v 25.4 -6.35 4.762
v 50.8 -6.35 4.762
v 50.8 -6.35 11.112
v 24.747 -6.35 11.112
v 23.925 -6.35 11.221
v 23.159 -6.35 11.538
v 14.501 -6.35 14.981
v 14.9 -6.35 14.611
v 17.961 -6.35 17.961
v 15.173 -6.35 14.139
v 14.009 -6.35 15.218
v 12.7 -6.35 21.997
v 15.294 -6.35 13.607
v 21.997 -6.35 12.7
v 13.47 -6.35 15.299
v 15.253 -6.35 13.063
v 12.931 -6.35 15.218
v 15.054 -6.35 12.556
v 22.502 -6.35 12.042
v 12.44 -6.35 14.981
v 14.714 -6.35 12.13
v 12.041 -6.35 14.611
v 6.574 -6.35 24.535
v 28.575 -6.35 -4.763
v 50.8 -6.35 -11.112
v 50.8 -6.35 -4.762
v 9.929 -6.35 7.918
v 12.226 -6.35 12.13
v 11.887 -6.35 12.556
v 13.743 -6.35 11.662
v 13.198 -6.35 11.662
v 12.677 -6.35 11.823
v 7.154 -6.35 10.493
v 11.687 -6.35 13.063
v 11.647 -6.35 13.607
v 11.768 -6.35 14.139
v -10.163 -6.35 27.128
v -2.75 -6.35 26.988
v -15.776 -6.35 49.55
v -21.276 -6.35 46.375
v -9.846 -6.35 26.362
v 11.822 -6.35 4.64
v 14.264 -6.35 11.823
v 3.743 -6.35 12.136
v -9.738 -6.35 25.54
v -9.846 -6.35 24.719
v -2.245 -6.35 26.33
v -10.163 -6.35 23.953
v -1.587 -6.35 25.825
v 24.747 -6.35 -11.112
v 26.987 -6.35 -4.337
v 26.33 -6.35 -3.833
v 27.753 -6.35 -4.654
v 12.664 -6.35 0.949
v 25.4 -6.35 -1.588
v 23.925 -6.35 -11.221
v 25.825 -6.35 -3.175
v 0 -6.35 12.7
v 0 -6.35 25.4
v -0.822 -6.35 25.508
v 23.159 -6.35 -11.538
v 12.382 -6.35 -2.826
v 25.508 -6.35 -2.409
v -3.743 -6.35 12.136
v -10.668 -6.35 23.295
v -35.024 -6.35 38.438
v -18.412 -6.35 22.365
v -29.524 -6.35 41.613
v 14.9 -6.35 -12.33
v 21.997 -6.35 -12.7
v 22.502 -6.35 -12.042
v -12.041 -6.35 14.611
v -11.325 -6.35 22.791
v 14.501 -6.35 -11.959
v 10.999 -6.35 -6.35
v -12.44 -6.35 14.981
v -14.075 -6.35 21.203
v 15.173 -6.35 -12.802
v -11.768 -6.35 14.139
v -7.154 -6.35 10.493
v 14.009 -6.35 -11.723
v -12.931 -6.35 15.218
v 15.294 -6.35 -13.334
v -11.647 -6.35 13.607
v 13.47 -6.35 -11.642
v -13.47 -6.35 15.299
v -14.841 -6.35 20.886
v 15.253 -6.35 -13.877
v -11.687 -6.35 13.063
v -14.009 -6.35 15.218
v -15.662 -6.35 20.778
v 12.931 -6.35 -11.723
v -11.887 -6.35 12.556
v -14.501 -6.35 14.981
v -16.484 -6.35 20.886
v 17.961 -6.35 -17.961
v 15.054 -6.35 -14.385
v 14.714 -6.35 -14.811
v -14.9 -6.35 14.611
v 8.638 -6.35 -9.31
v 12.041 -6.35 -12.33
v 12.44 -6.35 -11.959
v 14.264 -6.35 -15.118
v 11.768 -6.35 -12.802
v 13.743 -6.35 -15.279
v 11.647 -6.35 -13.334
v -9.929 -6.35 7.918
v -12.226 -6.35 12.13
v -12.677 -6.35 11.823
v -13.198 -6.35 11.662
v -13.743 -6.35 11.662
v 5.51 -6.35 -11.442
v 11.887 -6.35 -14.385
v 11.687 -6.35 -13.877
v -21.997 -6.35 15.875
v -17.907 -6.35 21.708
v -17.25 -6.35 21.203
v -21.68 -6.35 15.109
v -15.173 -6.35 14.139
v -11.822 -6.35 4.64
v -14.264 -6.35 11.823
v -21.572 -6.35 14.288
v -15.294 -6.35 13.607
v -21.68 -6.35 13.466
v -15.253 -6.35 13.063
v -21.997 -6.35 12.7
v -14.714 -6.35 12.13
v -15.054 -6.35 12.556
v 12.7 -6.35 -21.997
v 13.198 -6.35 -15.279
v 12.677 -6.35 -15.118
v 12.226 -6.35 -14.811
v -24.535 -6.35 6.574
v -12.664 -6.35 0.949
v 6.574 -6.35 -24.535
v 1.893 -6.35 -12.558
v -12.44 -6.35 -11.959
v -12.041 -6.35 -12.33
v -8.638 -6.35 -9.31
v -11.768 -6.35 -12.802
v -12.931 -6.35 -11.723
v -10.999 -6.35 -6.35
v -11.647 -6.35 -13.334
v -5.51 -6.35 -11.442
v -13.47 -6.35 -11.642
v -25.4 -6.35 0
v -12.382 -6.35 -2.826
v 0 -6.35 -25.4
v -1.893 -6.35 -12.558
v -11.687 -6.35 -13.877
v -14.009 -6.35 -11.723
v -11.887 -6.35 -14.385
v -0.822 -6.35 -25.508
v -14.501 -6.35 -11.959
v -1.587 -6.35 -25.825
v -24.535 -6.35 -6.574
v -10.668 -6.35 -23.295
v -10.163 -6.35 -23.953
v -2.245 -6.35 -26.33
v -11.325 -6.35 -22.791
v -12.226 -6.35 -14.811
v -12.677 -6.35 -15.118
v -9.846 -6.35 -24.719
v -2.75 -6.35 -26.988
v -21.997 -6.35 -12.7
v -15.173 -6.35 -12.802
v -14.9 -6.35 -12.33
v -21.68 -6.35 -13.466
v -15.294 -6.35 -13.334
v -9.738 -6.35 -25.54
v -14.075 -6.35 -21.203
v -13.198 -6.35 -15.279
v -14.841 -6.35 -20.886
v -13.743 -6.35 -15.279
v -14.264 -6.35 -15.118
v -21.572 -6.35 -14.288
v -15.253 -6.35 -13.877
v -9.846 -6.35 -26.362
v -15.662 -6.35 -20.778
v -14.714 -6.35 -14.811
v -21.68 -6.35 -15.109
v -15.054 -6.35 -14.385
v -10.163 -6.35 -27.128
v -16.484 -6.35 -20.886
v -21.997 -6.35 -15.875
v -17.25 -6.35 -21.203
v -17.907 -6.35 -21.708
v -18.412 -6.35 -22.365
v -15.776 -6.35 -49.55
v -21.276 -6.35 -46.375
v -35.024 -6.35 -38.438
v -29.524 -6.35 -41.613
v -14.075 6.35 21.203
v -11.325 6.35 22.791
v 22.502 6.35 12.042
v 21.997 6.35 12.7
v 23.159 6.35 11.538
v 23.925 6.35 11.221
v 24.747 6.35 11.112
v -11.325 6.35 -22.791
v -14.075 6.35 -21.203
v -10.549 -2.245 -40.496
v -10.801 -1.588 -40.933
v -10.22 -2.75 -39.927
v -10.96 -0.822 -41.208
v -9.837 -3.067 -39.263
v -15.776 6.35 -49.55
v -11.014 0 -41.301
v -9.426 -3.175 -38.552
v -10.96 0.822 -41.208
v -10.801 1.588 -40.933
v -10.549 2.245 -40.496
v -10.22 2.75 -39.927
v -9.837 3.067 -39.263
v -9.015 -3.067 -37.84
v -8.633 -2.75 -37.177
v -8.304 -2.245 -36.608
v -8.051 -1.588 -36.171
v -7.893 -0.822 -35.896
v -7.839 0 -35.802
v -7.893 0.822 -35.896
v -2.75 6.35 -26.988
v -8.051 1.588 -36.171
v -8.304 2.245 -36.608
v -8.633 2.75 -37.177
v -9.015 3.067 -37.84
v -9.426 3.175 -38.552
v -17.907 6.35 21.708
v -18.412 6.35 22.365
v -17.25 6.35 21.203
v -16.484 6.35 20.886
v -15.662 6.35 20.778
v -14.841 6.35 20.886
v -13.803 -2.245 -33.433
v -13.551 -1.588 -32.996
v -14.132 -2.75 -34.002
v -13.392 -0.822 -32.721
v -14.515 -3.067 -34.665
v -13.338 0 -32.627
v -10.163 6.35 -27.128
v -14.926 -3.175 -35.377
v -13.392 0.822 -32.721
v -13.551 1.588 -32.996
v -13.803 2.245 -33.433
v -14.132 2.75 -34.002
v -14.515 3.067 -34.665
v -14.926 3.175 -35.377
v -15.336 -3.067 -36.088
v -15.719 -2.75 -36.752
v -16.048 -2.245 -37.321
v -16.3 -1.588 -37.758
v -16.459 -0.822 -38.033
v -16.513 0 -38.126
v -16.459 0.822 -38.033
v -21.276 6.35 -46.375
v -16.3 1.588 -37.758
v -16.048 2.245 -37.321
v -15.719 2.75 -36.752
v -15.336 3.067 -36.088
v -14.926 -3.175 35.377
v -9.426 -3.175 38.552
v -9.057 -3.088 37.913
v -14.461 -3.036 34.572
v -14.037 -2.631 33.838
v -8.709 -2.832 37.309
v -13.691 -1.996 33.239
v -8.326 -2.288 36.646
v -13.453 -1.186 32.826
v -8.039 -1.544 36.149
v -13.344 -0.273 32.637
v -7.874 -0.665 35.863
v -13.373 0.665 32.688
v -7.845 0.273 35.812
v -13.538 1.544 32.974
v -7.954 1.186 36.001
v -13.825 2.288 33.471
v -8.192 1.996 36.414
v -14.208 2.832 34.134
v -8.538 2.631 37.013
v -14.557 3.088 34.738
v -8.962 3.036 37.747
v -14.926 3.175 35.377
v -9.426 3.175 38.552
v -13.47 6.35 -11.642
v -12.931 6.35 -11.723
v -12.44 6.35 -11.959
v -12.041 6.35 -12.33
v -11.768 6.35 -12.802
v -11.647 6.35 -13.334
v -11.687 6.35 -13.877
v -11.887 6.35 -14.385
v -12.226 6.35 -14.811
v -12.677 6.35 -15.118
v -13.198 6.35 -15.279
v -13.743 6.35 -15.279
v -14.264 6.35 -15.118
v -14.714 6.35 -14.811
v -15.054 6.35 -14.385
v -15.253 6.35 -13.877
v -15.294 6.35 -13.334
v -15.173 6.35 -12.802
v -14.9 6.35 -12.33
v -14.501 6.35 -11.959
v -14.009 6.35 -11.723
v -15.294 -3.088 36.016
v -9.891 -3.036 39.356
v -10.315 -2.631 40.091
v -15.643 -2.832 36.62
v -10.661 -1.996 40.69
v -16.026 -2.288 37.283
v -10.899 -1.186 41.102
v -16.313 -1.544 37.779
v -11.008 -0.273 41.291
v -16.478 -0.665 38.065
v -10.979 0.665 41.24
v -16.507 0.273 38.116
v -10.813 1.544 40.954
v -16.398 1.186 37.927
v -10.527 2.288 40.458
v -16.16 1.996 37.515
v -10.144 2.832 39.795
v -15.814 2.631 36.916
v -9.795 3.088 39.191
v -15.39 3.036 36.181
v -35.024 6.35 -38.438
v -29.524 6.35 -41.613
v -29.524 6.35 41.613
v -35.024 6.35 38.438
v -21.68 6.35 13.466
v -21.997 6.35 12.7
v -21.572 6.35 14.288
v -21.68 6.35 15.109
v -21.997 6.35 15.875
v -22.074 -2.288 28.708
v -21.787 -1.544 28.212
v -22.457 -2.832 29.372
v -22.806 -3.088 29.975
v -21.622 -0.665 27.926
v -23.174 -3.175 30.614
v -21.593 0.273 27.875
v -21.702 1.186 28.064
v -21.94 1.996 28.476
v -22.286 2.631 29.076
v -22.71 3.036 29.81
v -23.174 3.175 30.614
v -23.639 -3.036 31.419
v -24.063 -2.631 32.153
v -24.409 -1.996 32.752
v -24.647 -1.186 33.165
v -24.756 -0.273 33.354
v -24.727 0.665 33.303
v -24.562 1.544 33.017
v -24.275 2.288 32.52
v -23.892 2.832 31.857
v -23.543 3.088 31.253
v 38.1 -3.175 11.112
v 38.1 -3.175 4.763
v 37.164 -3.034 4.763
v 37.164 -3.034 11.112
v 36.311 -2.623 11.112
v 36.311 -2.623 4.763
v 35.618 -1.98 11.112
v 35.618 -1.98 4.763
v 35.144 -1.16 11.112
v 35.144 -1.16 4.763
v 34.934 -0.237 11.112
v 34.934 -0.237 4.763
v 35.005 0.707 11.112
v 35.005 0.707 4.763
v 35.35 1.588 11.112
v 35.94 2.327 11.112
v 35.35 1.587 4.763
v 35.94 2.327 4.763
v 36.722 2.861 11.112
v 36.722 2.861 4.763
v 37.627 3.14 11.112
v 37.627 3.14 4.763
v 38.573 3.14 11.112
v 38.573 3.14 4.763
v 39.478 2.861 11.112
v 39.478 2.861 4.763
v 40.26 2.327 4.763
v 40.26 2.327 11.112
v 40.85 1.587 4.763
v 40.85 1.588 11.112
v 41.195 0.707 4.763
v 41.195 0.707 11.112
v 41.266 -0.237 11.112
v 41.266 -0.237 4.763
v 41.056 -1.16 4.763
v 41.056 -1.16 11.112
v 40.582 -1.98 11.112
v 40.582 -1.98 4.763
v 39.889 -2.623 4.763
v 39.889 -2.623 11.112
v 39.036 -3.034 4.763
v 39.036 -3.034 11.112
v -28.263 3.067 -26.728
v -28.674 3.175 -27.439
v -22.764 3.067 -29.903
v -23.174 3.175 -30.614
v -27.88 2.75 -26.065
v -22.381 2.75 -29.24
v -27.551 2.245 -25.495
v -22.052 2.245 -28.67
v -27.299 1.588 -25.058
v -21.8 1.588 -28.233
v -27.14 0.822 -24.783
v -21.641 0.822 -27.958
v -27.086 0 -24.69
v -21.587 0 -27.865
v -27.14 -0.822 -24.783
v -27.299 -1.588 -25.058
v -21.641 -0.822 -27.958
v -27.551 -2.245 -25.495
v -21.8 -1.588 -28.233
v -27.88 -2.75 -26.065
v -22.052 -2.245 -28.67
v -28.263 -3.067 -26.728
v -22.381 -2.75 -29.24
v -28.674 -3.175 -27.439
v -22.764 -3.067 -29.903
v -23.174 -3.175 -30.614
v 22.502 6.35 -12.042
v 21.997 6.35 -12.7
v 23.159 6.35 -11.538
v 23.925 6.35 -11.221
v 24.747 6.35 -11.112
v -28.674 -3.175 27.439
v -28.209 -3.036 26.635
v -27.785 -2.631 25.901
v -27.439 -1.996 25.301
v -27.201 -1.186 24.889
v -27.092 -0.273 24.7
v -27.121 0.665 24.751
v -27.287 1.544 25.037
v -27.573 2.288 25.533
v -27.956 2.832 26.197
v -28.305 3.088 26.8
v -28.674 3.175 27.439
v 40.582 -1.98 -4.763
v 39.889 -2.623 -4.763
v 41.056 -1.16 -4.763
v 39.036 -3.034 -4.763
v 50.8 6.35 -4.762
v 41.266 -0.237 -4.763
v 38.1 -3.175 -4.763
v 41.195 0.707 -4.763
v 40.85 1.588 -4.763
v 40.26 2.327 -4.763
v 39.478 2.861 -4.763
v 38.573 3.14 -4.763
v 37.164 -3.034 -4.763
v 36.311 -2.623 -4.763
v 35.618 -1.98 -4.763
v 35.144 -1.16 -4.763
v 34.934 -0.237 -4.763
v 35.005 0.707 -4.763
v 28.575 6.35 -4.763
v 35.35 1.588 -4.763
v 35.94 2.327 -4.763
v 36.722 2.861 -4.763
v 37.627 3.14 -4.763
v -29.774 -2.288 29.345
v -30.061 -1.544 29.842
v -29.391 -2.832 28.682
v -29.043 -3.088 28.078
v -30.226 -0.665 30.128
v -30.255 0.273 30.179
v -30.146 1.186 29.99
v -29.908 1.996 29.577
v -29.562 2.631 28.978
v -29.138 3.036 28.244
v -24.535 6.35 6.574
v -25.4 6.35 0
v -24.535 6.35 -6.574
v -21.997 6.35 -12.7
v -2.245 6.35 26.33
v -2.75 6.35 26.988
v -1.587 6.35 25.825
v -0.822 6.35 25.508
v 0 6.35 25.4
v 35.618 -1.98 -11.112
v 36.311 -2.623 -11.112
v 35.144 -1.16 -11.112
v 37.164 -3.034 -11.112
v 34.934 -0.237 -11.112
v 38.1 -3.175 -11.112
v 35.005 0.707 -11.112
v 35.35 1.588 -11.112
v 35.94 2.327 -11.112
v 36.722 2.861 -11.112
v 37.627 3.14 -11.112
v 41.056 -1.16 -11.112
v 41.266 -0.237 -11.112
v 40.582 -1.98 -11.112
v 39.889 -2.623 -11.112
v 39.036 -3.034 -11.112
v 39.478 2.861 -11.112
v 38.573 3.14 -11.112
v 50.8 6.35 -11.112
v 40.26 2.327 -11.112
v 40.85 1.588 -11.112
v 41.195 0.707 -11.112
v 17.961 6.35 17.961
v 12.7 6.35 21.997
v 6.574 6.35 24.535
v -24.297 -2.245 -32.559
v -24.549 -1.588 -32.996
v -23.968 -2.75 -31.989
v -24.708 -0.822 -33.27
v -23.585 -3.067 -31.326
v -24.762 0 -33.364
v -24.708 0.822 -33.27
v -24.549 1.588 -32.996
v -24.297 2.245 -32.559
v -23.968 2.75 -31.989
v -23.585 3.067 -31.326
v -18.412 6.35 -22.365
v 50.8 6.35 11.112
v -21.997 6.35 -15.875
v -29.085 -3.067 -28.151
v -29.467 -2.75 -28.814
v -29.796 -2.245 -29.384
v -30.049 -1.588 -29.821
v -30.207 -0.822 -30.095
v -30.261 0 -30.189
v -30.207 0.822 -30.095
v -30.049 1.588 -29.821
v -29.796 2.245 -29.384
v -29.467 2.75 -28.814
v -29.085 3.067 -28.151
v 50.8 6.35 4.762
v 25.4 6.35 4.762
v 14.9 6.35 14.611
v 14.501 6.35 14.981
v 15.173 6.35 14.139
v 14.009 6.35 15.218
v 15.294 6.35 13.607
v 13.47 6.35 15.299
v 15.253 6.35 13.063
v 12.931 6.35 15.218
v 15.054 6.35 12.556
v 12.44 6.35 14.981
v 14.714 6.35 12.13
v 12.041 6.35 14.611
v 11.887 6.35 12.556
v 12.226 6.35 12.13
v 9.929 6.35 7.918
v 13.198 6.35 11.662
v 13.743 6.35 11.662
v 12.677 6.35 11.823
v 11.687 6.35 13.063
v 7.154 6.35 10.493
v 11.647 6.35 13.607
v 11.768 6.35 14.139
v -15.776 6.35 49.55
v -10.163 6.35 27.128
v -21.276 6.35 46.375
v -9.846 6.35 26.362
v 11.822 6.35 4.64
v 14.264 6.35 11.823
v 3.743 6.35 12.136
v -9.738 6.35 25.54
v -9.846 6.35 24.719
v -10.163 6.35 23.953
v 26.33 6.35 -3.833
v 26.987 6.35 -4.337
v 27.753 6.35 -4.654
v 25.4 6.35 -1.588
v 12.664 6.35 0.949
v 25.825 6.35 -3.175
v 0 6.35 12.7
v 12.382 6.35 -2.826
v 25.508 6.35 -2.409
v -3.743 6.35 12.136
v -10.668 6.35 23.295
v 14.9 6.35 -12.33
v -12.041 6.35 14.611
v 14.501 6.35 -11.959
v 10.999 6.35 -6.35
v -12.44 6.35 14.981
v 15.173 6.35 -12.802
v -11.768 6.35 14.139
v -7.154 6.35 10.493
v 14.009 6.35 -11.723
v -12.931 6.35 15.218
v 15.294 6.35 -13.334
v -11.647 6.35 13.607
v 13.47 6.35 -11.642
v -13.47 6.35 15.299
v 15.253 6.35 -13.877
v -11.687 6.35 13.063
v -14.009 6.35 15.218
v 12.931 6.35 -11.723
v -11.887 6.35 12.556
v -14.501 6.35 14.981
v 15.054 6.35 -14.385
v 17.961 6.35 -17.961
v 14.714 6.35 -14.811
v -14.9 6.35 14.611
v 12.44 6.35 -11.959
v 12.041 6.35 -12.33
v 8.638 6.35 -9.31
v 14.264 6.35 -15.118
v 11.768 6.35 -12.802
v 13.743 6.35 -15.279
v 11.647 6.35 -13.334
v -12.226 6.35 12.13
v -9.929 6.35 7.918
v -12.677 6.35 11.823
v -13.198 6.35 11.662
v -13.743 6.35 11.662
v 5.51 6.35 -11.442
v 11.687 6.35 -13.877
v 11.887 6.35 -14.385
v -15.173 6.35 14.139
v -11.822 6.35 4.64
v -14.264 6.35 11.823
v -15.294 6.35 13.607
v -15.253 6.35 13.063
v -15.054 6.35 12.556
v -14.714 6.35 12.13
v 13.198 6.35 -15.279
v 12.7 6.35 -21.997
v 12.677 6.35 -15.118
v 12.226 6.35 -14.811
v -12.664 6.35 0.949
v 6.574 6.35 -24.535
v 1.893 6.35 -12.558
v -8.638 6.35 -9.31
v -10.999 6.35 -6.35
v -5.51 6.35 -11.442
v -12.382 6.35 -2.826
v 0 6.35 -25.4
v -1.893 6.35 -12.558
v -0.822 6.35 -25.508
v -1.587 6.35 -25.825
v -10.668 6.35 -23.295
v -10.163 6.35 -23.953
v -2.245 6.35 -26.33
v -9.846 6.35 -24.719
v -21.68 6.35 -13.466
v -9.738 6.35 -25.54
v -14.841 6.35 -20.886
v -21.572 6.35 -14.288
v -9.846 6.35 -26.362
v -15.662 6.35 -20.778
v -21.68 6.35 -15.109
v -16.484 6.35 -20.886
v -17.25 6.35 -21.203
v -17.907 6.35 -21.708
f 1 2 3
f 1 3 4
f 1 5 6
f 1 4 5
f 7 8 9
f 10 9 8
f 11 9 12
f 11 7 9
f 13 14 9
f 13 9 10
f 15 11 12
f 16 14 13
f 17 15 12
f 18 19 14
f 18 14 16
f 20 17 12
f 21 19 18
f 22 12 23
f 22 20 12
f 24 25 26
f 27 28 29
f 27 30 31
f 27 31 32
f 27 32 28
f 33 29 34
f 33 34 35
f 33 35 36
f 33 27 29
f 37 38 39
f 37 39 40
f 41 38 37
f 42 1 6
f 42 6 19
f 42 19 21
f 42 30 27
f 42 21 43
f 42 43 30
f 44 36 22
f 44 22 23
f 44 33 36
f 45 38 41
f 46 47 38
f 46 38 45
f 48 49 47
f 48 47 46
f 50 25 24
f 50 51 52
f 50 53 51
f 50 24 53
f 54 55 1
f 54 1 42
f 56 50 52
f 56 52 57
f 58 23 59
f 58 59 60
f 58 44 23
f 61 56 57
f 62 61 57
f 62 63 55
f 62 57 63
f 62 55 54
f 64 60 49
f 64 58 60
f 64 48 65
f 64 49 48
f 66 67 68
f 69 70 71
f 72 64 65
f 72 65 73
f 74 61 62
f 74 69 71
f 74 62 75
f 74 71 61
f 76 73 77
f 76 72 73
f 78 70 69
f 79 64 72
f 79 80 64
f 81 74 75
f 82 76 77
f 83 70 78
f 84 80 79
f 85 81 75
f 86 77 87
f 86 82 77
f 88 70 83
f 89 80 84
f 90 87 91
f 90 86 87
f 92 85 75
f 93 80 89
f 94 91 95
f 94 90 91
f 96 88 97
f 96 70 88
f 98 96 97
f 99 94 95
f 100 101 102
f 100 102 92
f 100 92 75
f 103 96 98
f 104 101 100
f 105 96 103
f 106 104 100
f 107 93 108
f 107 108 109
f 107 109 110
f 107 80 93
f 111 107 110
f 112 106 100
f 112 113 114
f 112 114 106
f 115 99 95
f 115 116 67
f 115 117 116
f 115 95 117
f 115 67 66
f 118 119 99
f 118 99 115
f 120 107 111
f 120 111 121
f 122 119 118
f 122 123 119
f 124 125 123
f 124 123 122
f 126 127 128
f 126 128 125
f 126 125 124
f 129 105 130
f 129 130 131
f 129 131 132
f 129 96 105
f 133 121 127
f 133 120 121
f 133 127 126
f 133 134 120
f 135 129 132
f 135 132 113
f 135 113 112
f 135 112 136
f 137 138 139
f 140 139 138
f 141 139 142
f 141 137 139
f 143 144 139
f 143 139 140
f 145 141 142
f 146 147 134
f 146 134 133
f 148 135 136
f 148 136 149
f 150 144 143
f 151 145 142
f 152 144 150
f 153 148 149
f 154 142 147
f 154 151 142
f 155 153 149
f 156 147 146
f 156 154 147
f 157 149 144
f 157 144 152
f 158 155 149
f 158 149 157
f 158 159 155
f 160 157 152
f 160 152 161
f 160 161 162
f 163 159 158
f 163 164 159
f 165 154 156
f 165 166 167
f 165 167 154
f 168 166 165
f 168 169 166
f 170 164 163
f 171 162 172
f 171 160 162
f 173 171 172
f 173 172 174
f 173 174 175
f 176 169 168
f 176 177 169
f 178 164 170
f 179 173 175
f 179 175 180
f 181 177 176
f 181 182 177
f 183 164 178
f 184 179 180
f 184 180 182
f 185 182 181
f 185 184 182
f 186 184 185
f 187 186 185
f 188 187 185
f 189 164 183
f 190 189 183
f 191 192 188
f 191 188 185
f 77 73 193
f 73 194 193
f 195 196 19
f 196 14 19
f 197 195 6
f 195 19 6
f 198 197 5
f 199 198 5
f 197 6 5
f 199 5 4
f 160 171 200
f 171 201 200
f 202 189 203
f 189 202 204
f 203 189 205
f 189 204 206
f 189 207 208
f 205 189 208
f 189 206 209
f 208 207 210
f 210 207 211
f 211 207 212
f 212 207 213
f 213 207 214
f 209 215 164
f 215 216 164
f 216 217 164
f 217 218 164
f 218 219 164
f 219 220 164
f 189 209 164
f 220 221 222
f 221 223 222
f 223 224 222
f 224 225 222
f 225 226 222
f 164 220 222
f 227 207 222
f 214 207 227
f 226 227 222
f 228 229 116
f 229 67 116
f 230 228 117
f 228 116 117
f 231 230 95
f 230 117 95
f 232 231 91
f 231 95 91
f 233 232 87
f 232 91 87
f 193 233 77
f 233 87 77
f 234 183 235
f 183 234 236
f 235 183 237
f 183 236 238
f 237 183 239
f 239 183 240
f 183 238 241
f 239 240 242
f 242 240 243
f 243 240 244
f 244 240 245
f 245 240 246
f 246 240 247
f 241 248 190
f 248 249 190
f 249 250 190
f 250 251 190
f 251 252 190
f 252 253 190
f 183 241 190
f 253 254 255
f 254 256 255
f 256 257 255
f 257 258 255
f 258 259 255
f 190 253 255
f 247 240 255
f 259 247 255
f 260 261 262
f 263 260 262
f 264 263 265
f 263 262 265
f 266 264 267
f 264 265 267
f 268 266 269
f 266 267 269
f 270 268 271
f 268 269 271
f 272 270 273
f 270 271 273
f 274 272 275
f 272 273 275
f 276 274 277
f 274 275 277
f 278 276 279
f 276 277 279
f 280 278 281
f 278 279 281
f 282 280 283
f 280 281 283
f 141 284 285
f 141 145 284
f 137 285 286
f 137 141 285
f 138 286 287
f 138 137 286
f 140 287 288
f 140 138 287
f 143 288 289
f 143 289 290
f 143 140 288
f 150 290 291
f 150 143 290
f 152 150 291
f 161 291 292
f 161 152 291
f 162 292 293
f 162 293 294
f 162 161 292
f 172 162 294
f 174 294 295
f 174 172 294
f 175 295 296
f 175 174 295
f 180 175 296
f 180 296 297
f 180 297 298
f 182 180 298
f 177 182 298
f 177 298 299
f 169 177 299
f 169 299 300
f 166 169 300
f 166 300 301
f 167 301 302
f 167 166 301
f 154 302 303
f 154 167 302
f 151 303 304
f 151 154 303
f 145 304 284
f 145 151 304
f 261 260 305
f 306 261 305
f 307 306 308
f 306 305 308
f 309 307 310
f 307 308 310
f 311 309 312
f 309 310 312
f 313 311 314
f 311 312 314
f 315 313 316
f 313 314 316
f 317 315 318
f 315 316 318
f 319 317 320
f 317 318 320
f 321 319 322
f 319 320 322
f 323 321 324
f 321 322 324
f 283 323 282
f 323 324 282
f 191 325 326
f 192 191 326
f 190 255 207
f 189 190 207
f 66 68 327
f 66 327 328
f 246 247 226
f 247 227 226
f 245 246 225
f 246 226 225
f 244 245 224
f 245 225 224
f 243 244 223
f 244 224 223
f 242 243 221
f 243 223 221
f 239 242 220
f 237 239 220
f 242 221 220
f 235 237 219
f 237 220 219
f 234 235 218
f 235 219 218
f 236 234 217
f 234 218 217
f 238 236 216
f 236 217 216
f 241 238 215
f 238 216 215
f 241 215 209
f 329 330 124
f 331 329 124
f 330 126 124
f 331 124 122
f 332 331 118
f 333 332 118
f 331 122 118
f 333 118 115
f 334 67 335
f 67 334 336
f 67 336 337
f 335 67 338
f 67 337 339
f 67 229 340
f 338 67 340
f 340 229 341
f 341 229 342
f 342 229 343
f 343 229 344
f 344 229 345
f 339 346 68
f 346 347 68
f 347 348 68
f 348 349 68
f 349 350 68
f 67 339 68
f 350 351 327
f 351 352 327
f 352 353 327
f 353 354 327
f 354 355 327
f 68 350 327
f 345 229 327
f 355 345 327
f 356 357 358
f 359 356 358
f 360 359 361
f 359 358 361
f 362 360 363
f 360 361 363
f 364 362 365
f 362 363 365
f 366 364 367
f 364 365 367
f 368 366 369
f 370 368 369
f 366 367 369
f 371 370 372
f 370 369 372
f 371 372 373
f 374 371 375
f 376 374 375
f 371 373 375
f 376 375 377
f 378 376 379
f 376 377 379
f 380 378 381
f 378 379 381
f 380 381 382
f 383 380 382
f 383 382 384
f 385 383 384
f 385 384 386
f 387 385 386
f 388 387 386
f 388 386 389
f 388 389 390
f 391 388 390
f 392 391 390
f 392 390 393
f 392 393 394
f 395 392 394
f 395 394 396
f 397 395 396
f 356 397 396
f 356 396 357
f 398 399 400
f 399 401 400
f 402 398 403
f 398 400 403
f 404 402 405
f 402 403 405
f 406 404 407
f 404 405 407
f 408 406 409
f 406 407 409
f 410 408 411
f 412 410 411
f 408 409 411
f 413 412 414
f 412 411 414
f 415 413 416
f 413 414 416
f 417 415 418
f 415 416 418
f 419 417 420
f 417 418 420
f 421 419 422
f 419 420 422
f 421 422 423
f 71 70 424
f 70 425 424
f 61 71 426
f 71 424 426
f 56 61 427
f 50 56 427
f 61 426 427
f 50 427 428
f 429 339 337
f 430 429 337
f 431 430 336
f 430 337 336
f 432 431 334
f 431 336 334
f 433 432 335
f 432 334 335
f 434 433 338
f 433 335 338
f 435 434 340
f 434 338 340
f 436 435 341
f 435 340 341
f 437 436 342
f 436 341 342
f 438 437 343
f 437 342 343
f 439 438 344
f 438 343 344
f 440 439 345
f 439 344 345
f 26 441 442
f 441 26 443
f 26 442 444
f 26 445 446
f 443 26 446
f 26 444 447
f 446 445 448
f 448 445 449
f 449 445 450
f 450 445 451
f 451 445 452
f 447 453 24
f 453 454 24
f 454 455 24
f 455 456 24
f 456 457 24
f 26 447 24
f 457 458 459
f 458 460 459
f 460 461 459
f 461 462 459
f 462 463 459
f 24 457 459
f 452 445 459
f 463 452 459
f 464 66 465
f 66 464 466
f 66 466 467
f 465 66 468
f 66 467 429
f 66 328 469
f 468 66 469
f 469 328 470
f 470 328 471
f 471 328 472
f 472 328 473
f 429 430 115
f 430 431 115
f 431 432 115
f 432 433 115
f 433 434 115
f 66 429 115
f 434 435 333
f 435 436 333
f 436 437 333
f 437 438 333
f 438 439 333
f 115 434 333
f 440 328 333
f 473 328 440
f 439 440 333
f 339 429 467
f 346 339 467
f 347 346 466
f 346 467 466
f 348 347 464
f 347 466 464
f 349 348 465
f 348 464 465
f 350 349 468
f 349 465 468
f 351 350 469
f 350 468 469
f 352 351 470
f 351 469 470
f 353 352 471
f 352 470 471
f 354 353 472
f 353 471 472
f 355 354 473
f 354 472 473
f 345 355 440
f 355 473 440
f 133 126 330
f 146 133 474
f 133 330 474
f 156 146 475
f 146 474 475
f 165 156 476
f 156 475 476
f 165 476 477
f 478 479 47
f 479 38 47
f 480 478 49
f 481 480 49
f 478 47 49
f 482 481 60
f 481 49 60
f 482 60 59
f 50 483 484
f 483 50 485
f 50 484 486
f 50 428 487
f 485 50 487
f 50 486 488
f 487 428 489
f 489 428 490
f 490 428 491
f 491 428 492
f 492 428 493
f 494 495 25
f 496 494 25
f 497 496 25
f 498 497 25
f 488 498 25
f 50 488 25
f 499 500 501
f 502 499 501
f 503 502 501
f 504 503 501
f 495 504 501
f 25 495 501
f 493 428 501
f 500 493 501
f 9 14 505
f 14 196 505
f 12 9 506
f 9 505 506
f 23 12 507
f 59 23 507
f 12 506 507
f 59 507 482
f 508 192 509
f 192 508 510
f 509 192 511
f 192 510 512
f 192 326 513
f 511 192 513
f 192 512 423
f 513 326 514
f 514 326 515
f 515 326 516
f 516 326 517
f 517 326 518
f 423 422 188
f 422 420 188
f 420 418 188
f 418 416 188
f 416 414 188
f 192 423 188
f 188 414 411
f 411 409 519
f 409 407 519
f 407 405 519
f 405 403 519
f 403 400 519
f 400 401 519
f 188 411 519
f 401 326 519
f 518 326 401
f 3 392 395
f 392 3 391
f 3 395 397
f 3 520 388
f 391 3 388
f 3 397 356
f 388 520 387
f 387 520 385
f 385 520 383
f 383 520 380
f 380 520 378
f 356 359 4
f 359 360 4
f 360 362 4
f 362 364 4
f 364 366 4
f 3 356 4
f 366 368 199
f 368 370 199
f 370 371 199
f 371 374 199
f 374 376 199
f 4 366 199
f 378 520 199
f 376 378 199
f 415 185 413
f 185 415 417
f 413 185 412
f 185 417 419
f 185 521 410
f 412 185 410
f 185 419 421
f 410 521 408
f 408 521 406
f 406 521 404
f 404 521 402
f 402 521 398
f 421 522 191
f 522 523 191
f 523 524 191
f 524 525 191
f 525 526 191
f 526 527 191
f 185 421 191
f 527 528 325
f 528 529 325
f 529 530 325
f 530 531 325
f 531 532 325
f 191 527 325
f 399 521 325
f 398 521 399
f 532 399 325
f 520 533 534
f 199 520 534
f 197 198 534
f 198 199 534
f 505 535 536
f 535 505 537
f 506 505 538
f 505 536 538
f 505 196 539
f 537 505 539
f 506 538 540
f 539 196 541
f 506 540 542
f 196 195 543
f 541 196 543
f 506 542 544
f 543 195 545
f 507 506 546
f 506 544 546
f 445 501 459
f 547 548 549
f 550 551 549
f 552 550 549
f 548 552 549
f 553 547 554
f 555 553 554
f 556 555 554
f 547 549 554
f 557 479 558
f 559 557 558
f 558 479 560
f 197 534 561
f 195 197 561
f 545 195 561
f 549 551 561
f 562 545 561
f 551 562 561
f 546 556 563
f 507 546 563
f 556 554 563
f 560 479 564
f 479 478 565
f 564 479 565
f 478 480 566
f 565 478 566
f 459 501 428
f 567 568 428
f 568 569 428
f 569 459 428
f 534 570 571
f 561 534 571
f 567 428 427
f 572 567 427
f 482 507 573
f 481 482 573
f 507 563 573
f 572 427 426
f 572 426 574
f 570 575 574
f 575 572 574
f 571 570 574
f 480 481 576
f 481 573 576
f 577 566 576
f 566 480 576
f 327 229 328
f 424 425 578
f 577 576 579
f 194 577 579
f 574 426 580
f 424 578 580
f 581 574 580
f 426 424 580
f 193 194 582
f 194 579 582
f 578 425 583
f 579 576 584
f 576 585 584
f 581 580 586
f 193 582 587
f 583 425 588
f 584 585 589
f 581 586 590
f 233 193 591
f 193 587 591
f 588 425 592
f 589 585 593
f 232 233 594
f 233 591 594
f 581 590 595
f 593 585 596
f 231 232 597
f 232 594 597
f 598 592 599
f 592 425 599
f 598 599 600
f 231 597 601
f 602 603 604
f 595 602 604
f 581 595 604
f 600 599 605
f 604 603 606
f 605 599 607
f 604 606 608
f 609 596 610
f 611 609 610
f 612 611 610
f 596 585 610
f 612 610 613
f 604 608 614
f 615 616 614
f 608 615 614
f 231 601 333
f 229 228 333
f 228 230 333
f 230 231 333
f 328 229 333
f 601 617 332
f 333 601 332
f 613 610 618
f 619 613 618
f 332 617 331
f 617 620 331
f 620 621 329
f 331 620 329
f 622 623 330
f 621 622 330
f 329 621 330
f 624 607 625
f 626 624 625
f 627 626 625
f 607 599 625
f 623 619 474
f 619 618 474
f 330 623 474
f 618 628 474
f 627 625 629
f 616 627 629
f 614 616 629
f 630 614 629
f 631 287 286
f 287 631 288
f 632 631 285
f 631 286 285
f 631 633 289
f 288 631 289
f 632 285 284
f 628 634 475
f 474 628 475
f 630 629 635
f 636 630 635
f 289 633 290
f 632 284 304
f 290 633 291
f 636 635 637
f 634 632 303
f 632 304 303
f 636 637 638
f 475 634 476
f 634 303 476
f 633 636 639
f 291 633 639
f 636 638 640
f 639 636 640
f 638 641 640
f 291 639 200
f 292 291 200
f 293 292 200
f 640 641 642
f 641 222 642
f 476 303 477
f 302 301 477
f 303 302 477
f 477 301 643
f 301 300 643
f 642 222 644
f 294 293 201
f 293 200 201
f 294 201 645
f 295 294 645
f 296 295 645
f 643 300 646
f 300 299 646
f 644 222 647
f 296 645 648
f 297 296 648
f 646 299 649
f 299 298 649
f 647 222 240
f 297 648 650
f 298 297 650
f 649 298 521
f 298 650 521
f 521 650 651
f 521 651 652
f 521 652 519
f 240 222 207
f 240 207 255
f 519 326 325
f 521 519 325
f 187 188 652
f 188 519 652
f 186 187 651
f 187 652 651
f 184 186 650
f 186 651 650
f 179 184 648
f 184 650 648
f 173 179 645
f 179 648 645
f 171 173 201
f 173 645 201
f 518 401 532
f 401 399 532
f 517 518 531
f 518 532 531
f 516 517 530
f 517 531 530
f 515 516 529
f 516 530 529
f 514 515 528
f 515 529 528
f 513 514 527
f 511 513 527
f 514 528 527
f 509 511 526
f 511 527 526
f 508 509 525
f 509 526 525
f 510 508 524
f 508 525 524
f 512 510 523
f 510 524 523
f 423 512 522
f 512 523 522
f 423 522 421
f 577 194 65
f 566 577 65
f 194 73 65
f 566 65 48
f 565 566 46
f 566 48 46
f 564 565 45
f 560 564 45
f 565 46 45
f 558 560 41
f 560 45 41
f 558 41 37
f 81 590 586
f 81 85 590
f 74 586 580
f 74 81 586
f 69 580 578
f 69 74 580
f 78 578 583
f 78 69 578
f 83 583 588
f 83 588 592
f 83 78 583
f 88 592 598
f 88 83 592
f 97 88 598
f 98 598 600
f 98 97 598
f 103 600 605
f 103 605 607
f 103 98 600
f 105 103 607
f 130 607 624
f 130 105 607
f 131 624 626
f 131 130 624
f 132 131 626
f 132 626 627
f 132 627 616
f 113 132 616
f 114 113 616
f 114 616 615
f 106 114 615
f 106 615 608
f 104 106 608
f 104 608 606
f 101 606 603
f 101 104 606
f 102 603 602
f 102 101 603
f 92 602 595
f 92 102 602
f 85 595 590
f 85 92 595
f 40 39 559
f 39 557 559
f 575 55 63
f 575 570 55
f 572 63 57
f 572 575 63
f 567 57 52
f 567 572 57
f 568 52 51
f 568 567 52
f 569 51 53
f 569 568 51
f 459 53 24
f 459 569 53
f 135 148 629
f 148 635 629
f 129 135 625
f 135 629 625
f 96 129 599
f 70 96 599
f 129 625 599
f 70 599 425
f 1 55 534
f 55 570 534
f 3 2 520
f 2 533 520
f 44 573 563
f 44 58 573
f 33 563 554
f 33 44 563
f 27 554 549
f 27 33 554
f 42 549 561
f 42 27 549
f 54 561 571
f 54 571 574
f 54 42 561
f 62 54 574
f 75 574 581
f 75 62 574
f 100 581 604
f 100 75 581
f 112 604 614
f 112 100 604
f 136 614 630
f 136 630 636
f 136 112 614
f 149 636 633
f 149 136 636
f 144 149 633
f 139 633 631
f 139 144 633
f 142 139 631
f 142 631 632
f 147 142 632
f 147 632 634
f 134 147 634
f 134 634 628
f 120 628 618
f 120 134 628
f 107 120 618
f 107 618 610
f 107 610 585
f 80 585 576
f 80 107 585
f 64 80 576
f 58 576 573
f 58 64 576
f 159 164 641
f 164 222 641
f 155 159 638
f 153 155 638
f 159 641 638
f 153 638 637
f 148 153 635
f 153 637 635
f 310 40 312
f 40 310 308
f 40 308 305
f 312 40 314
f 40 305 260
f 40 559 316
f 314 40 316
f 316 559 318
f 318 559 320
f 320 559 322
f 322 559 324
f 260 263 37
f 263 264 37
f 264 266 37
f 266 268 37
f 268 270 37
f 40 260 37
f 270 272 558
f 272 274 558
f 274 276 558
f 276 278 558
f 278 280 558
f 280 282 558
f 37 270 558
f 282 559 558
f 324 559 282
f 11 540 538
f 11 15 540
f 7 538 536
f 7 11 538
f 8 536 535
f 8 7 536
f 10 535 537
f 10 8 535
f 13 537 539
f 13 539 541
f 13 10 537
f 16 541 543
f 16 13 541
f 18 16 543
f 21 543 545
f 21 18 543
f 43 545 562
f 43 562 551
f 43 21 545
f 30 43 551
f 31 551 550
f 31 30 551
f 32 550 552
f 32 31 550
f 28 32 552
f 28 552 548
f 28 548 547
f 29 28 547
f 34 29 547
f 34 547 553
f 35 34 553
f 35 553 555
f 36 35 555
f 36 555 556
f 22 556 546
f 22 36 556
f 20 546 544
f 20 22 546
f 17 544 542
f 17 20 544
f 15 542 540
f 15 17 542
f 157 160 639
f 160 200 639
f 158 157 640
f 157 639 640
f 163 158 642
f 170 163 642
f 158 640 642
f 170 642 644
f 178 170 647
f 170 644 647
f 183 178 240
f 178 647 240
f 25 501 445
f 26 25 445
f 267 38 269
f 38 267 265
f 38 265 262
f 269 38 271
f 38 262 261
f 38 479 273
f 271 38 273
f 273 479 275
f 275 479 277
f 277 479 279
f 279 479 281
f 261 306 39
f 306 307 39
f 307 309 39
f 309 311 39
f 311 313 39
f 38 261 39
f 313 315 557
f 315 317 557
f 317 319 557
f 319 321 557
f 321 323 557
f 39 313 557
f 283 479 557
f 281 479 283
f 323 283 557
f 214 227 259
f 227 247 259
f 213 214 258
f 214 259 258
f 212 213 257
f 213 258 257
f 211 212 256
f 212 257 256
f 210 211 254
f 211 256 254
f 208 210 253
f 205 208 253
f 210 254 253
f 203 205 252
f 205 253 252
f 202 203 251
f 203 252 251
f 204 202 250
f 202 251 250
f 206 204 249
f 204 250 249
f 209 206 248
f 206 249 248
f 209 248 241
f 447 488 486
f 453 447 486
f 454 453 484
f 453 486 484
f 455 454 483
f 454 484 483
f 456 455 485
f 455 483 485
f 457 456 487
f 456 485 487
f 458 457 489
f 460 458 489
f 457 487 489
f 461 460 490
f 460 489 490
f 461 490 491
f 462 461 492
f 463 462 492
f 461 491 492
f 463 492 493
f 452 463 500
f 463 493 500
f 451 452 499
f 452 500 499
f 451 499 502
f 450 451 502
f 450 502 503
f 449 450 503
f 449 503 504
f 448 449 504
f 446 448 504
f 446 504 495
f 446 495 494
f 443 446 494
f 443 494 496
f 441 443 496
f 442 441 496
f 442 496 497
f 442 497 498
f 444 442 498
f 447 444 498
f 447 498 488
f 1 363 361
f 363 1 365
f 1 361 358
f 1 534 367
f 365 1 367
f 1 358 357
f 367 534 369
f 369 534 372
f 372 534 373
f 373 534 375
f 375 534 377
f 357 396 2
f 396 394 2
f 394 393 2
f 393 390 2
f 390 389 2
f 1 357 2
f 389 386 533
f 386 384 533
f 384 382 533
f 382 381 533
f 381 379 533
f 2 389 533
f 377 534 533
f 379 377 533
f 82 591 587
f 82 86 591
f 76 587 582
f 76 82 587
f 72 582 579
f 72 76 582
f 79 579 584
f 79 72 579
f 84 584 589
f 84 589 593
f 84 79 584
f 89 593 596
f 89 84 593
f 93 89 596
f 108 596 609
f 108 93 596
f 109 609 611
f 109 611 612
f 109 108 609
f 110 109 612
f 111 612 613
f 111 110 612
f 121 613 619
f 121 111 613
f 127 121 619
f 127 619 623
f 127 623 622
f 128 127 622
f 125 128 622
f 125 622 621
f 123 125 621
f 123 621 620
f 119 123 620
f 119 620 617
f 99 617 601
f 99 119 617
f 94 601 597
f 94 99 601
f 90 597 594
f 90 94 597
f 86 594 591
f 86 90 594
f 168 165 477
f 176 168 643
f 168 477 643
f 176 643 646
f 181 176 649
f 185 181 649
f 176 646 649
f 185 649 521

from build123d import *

# Parameters (mm, degrees)
SKETCH1_R                             = 12.7
SKETCH1_R_2                           = 1.8288
BOSS_EXTRUDE1_DEPTH                   = 6.35
F_1_4_0_25_DIAMETER_HOLE1_D           = 6.35
F_1_4_0_25_DIAMETER_HOLE1_ON_FACE_2_D = 6.35
F_1_4_0_25_DIAMETER_HOLE1_ON_FACE_3_D = 6.35
F_1_4_0_25_DIAMETER_HOLE1_ON_FACE_4_D = 6.35
F_1_4_0_25_DIAMETER_HOLE1_ON_FACE_5_D = 6.35
F_1_4_0_25_DIAMETER_HOLE1_ON_FACE_6_D = 6.35
FILLET1_R                             = 3.175


with BuildPart() as part:
    # Sketch1 → Boss-Extrude1 (new, symmetric)
    with BuildSketch(Plane(origin=(0, 0, 0), x_dir=(1, 0, 0), z_dir=(0, 1, 0))):
        with BuildLine():
            Line((25.4, 4.7625), (25.4, -4.7625))
            Line((25.4, -4.7625), (50.8, -4.7625))
            Line((50.8, -4.7625), (50.8, -11.1125))
            Line((50.8, -11.1125), (22.84014763, -11.1125))
            ThreePointArc((22.84014763, -11.1125), (12.7, -21.997045256), (-1.796366515, -25.336398074))
            Line((-1.796366515, -25.336398074), (-15.7762927, -49.550340512))
            Line((-15.7762927, -49.550340512), (-21.275554014, -46.375340512))
            Line((-21.275554014, -46.375340512), (-8.575554014, -24.378295256))
            Line((-8.575554014, -24.378295256), (-16.824445986, -19.615795256))
            Line((-16.824445986, -19.615795256), (-29.524445986, -41.612840512))
            Line((-29.524445986, -41.612840512), (-35.0237073, -38.437840512))
            Line((-35.0237073, -38.437840512), (-21.043781114, -14.223898074))
            ThreePointArc((-21.043781114, -14.223898074), (-25.4, 0), (-21.043781114, 14.223898074))
            Line((-21.043781114, 14.223898074), (-35.0237073, 38.437840512))
            Line((-35.0237073, 38.437840512), (-29.524445986, 41.612840512))
            Line((-29.524445986, 41.612840512), (-16.824445986, 19.615795256))
            Line((-16.824445986, 19.615795256), (-8.575554014, 24.378295256))
            Line((-8.575554014, 24.378295256), (-21.275554014, 46.375340512))
            Line((-21.275554014, 46.375340512), (-15.7762927, 49.550340512))
            Line((-15.7762927, 49.550340512), (-1.796366515, 25.336398074))
            ThreePointArc((-1.796366515, 25.336398074), (12.7, 21.997045256), (22.84014763, 11.1125))
            Line((22.84014763, 11.1125), (50.8, 11.1125))
            Line((50.8, 11.1125), (50.8, 4.7625))
            Line((50.8, 4.7625), (25.4, 4.7625))
        make_face()
        with Locations(Location((0, 0, 0), (0, 0, 270))):
            Circle(SKETCH1_R, mode=Mode.SUBTRACT)
        with Locations(Location((-13.470384182, 13.470384182, 0), (0, 0, 270))):
            Circle(SKETCH1_R_2, mode=Mode.SUBTRACT)
        with Locations(Location((13.470384182, 13.470384182, 0), (0, 0, 270))):
            Circle(SKETCH1_R_2, mode=Mode.SUBTRACT)
        with Locations(Location((13.470384182, -13.470384182, 0), (0, 0, 270))):
            Circle(SKETCH1_R_2, mode=Mode.SUBTRACT)
        with Locations(Location((-13.470384182, -13.470384182, 0), (0, 0, 270))):
            Circle(SKETCH1_R_2, mode=Mode.SUBTRACT)
    extrude(amount=BOSS_EXTRUDE1_DEPTH, both=True)

    # 1/4 (0.25) Diameter Hole1 (through all)
    with Locations(Plane(origin=(38.1, 0, -4.7625), x_dir=(0, 1, 0), z_dir=(0, 0, 1))):
        with Locations((0, 0)):
            Hole(F_1_4_0_25_DIAMETER_HOLE1_D / 2)

    # 1/4 (0.25) Diameter Hole1 on face 2 (through all)
    with Locations(Plane(origin=(-14.925554014, 0, -35.376817884), x_dir=(-0.500000174844, 0, -0.866025302838), z_dir=(-0.866025302838, 0, 0.500000174844))):
        with Locations((0, 0)):
            Hole(F_1_4_0_25_DIAMETER_HOLE1_ON_FACE_2_D / 2)

    # 1/4 (0.25) Diameter Hole1 on face 3 (through all)
    with Locations(Plane(origin=(-23.174445986, 0, 30.614317884), x_dir=(-0.500000174844, 0, 0.866025302838), z_dir=(0.866025302838, 0, 0.500000174844))):
        with Locations((0, 0)):
            Hole(F_1_4_0_25_DIAMETER_HOLE1_ON_FACE_3_D / 2)

    # 1/4 (0.25) Diameter Hole1 on face 4 (through all)
    with Locations(Plane(origin=(-14.925554014, 0, 35.376817884), x_dir=(0.500000174844, 0, -0.866025302838), z_dir=(-0.866025302838, 0, -0.500000174844))):
        with Locations((0, 0)):
            Hole(F_1_4_0_25_DIAMETER_HOLE1_ON_FACE_4_D / 2)

    # 1/4 (0.25) Diameter Hole1 on face 5 (through all)
    with Locations(Plane(origin=(-23.174445986, 0, -30.614317884), x_dir=(0.500000174844, 0, 0.866025302838), z_dir=(0.866025302838, 0, -0.500000174844))):
        with Locations((0, 0)):
            Hole(F_1_4_0_25_DIAMETER_HOLE1_ON_FACE_5_D / 2)

    # 1/4 (0.25) Diameter Hole1 on face 6 (through all)
    with Locations(Plane(origin=(38.1, 0, 4.7625), x_dir=(-1, 0, 0), z_dir=(0, 0, -1))):
        with Locations((0, 0)):
            Hole(F_1_4_0_25_DIAMETER_HOLE1_ON_FACE_6_D / 2)

    # Fillet1
    fillet1_edges = [part.edges().sort_by_distance(p)[0] for p in [
        (25.4, 0, -4.7625),
        (22.84014763, 0, 11.1125),
        (-1.796366515, 0, 25.336398074),
        (-8.575554014, 0, 24.378295256),
        (-16.824445986, 0, 19.615795256),
        (-21.043781114, 0, 14.223898074),
        (-21.043781114, 0, -14.223898074),
        (-16.824445986, 0, -19.615795256),
        (-8.575554014, 0, -24.378295256),
        (-1.796366515, 0, -25.336398074),
        (22.84014763, 0, -11.1125),
    ]]
    fillet(fillet1_edges, radius=FILLET1_R)


solid = part.part
